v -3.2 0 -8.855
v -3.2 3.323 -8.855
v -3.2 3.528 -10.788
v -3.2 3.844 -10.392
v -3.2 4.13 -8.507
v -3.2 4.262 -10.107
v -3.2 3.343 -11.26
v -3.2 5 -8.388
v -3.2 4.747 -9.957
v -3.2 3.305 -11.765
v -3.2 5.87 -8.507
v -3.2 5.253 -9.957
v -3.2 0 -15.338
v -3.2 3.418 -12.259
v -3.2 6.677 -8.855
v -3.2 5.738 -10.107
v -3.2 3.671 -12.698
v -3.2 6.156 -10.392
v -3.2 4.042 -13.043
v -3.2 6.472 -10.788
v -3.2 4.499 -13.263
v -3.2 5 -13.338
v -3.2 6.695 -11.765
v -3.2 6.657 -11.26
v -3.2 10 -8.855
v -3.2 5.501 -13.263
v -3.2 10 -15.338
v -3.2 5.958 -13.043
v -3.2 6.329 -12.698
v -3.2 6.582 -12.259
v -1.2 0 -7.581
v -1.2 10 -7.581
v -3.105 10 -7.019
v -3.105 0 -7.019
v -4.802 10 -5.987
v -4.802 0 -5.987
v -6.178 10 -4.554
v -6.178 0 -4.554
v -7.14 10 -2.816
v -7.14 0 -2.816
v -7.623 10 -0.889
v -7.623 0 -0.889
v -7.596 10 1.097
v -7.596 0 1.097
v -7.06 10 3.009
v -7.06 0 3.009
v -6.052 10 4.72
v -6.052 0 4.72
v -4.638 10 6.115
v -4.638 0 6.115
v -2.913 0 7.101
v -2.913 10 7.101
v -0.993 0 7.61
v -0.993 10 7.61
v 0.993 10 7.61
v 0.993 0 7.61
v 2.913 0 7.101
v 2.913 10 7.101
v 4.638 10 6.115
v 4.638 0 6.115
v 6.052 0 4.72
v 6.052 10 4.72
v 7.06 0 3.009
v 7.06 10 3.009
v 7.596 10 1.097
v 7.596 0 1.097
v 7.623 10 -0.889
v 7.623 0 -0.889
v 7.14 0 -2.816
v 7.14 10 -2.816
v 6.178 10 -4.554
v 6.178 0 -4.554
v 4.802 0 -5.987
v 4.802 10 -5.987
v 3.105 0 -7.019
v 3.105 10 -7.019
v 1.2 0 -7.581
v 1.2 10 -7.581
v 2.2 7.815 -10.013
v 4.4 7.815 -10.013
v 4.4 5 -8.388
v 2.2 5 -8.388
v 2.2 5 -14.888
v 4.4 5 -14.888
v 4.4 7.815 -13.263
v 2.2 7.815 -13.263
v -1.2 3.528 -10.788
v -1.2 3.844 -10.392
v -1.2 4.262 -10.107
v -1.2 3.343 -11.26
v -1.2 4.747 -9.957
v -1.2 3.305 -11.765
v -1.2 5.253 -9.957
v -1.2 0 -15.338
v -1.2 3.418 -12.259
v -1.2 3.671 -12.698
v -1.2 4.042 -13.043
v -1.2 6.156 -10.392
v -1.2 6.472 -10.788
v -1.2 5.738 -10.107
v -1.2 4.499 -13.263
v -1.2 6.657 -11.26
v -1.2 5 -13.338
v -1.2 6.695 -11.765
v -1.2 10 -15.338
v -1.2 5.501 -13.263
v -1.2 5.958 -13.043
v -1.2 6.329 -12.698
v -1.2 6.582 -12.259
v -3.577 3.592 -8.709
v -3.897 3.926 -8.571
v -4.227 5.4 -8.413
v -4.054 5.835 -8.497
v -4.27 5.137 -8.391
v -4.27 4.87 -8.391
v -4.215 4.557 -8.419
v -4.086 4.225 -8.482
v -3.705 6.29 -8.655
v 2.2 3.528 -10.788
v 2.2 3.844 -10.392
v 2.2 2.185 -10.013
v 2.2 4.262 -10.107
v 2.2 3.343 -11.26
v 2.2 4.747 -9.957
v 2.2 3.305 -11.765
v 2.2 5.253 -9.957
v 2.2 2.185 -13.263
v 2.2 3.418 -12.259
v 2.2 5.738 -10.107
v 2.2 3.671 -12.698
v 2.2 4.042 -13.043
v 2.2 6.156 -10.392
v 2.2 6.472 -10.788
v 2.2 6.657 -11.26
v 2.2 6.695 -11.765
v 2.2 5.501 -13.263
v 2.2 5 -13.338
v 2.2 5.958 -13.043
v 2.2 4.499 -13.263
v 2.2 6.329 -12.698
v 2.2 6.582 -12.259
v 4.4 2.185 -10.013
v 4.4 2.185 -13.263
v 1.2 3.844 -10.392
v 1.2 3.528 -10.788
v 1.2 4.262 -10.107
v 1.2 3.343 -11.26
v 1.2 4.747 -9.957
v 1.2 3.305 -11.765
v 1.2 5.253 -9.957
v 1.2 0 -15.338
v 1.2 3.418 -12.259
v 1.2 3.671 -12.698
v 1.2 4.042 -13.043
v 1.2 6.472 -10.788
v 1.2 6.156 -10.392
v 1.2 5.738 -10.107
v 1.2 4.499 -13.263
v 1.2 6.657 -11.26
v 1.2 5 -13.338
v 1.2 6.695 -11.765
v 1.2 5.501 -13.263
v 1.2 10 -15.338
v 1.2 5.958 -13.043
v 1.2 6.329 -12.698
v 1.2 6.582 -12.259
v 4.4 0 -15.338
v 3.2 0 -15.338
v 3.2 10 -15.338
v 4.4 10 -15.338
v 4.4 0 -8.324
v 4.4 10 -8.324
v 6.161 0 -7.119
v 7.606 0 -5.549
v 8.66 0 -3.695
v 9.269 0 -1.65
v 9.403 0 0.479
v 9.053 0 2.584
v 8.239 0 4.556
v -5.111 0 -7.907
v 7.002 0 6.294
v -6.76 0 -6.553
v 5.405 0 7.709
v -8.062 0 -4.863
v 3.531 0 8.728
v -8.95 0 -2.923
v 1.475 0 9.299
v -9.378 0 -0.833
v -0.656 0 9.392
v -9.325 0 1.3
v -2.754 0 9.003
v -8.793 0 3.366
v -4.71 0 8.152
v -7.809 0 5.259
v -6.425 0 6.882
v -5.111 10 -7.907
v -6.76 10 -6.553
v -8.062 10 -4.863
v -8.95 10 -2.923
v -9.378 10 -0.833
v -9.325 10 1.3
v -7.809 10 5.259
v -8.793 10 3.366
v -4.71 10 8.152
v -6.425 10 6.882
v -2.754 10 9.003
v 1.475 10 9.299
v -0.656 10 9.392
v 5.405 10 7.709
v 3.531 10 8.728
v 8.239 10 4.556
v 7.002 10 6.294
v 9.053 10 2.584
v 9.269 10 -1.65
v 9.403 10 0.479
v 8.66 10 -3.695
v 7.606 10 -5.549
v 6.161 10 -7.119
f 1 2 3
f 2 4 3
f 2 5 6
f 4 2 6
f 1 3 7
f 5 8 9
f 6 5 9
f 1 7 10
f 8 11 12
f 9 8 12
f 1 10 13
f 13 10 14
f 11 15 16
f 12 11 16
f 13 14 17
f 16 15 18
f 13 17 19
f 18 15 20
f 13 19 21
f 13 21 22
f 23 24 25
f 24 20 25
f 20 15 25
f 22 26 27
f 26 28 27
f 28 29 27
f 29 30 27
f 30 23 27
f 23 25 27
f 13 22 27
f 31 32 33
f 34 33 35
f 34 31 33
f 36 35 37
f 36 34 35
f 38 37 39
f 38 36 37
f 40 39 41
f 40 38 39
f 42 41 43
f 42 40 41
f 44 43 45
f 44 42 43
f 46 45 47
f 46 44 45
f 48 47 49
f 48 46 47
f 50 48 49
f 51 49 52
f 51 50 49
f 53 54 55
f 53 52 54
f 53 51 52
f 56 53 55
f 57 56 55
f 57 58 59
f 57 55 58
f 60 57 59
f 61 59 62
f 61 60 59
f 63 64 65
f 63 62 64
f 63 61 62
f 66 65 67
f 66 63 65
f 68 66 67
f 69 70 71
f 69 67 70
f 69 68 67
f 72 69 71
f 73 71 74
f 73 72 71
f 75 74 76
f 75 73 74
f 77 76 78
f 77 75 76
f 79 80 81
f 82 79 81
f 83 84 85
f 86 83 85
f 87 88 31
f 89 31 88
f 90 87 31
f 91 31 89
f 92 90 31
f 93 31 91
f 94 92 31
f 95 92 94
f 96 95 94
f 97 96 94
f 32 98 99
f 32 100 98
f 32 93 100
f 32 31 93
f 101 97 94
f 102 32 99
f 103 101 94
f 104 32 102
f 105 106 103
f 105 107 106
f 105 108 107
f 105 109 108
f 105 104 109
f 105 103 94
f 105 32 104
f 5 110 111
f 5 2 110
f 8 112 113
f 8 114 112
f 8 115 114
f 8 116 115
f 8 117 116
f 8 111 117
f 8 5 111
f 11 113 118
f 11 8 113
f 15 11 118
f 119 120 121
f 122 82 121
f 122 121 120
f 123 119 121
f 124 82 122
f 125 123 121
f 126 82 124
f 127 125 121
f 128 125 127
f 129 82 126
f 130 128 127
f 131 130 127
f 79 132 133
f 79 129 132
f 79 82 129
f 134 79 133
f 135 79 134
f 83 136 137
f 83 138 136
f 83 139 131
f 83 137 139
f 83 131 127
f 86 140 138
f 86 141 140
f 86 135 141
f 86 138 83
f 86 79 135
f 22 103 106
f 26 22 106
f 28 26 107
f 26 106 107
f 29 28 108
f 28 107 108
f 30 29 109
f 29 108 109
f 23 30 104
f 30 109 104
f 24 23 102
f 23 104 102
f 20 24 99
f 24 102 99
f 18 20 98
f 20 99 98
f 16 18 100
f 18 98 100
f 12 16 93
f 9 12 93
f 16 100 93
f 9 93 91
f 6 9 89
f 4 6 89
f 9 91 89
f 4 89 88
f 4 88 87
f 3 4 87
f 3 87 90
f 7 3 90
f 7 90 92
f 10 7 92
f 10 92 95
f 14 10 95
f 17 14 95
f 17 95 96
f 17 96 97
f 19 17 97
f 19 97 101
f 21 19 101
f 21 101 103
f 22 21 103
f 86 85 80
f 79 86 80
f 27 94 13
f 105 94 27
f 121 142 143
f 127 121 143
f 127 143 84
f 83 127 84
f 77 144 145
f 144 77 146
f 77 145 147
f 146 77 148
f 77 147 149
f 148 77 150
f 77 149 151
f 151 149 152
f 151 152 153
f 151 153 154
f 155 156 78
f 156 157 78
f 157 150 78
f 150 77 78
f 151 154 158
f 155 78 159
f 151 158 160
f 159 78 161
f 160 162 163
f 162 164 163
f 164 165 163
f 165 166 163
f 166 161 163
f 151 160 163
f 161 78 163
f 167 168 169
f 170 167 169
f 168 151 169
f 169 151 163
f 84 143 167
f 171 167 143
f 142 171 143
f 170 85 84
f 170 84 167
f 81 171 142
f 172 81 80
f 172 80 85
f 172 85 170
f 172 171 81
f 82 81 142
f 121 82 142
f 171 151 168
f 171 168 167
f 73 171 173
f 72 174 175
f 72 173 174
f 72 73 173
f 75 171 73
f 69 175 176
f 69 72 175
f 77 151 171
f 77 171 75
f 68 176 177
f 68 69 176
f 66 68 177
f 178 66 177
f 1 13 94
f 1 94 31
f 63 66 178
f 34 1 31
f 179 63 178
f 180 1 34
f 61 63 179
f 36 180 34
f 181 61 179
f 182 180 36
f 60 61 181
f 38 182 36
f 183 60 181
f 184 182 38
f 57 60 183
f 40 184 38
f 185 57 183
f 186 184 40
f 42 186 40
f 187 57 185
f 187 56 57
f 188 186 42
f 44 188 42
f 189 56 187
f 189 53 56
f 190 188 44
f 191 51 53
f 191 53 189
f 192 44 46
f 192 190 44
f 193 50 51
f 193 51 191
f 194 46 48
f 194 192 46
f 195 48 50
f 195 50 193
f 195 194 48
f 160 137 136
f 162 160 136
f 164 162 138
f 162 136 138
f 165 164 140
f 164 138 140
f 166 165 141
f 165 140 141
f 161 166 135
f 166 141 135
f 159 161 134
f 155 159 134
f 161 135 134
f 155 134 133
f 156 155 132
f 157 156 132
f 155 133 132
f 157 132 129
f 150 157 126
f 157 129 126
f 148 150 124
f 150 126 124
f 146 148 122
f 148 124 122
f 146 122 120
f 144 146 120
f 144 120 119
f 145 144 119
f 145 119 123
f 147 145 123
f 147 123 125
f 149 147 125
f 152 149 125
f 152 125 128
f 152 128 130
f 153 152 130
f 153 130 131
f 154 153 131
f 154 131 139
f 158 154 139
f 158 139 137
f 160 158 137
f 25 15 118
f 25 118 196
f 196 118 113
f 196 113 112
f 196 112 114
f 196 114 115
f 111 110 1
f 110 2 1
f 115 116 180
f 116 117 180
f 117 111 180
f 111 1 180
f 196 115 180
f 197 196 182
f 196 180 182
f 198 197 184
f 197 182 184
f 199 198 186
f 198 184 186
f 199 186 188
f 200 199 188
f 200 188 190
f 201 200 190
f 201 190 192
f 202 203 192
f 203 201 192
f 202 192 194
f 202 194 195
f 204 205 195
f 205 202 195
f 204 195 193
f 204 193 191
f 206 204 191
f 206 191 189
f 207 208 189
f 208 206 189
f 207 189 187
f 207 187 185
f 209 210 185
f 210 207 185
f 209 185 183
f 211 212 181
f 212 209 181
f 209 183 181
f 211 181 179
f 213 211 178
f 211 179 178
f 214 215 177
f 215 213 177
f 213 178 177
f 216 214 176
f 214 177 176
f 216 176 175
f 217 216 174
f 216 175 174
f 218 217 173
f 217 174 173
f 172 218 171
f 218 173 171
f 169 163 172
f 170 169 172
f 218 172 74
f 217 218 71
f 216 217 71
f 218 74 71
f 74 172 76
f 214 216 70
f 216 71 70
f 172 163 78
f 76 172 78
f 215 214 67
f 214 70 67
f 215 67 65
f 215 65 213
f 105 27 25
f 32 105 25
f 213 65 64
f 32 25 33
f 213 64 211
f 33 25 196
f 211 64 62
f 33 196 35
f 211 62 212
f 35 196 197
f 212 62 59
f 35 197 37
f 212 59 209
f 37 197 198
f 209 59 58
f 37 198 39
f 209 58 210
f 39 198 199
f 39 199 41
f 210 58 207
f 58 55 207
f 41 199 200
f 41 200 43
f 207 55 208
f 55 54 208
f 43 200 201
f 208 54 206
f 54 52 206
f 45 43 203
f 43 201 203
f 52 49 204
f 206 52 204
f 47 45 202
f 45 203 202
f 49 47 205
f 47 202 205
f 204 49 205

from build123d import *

# Parameters (mm, degrees)
SKETCH1_R            = 9.415
SKETCH1_R_2          = 7.675
EXTRUDE_THIN1_DEPTH  = 10
SKETCH2_W            = 2.4
SKETCH2_H            = 11.262029822
CUT_EXTRUDE1_DEPTH   = 10
BOSS_EXTRUDE1_DEPTH  = 2
SKETCH5_R            = 1.7
CUT_EXTRUDE2_DEPTH   = 10
MOVE_START           = 3.2
MOVE_FACE1_OUTLINE_W = 10
MOVE_FACE1_OUTLINE_H = 8.338213159
MOVE_FACE1_OUTLINE_R = 1.7
MOVE_FACE1_DEPTH     = 1.2
CUT_EXTRUDE3_DEPTH   = 2.2
SKETCH8_R            = 3.25
CUT_EXTRUDE4_DEPTH   = 3


# Read off the part's stored shape, not the designer's step: Move Face1
with BuildPart() as part:
    # Sketch1 → Extrude-Thin1 (new body)
    with BuildSketch(Plane(origin=(0, 0, 0), x_dir=(1, 0, 0), z_dir=(0, 1, 0))):
        Circle(SKETCH1_R)
        Circle(SKETCH1_R_2, mode=Mode.SUBTRACT)
    extrude(amount=EXTRUDE_THIN1_DEPTH)

    # Sketch2 → Cut-Extrude1 (cut)
    with BuildSketch(Plane(origin=(0, 10, 0), x_dir=(1, 0, 0), z_dir=(0, 1, 0))):
        with Locations((0, 7.042452335)):
            Rectangle(SKETCH2_W, SKETCH2_H)
    extrude(amount=-CUT_EXTRUDE1_DEPTH, mode=Mode.SUBTRACT)

    # Sketch4 → Boss-Extrude1 (add)
    with BuildSketch(Plane(origin=(-1.2, 0, 0), x_dir=(0, 0, -1), z_dir=(1, 0, 0))):
        Polygon((9.338213159, 10), (8.459410822, 10), (8.459410822, 0), (9.338213159, 0), (15.338213159, 0), (15.338213159, 10), align=None)
    boss_extrude1 = extrude(amount=-BOSS_EXTRUDE1_DEPTH)

    # Mirror1: Boss-Extrude1 across plane
    add(boss_extrude1.mirror(Plane(origin=(0, 0, 0), x_dir=(0, 0, 1), z_dir=(1, 0, 0))))

    # Sketch5 → Cut-Extrude2 (cut)
    with BuildSketch(Plane(origin=(3.2, 0, 0), x_dir=(0, 0, -1), z_dir=(1, 0, 0))):
        with Locations((11.638213159, 5)):
            Circle(SKETCH5_R)
    extrude(amount=-CUT_EXTRUDE2_DEPTH, mode=Mode.SUBTRACT)

    # Move Face1 outline → Move Face1 (add)
    with BuildSketch(Plane.YZ.offset(MOVE_START)):
        with Locations((5, -11.169106579)):
            Rectangle(MOVE_FACE1_OUTLINE_W, MOVE_FACE1_OUTLINE_H)
        with Locations((5, -11.638213159)):
            Circle(MOVE_FACE1_OUTLINE_R, mode=Mode.SUBTRACT)
    extrude(amount=MOVE_FACE1_DEPTH)

    # Sketch7 → Cut-Extrude3 (cut)
    with BuildSketch(Plane(origin=(4.4, 0, 0), x_dir=(0, 0, -1), z_dir=(1, 0, 0))):
        Polygon((14.888213159, 5), (13.263213159, 7.814582562), (10.013213159, 7.814582562), (8.388213159, 5), (10.013213159, 2.185417438), (13.263213159, 2.185417438), align=None)
    extrude(amount=-CUT_EXTRUDE3_DEPTH, mode=Mode.SUBTRACT)

    # Sketch8 → Cut-Extrude4 (cut)
    with BuildSketch(Plane.ZY.offset(3.2)):
        with Locations((-11.638213159, 5)):
            Circle(SKETCH8_R)
    extrude(amount=CUT_EXTRUDE4_DEPTH, mode=Mode.SUBTRACT)


solid = part.part
